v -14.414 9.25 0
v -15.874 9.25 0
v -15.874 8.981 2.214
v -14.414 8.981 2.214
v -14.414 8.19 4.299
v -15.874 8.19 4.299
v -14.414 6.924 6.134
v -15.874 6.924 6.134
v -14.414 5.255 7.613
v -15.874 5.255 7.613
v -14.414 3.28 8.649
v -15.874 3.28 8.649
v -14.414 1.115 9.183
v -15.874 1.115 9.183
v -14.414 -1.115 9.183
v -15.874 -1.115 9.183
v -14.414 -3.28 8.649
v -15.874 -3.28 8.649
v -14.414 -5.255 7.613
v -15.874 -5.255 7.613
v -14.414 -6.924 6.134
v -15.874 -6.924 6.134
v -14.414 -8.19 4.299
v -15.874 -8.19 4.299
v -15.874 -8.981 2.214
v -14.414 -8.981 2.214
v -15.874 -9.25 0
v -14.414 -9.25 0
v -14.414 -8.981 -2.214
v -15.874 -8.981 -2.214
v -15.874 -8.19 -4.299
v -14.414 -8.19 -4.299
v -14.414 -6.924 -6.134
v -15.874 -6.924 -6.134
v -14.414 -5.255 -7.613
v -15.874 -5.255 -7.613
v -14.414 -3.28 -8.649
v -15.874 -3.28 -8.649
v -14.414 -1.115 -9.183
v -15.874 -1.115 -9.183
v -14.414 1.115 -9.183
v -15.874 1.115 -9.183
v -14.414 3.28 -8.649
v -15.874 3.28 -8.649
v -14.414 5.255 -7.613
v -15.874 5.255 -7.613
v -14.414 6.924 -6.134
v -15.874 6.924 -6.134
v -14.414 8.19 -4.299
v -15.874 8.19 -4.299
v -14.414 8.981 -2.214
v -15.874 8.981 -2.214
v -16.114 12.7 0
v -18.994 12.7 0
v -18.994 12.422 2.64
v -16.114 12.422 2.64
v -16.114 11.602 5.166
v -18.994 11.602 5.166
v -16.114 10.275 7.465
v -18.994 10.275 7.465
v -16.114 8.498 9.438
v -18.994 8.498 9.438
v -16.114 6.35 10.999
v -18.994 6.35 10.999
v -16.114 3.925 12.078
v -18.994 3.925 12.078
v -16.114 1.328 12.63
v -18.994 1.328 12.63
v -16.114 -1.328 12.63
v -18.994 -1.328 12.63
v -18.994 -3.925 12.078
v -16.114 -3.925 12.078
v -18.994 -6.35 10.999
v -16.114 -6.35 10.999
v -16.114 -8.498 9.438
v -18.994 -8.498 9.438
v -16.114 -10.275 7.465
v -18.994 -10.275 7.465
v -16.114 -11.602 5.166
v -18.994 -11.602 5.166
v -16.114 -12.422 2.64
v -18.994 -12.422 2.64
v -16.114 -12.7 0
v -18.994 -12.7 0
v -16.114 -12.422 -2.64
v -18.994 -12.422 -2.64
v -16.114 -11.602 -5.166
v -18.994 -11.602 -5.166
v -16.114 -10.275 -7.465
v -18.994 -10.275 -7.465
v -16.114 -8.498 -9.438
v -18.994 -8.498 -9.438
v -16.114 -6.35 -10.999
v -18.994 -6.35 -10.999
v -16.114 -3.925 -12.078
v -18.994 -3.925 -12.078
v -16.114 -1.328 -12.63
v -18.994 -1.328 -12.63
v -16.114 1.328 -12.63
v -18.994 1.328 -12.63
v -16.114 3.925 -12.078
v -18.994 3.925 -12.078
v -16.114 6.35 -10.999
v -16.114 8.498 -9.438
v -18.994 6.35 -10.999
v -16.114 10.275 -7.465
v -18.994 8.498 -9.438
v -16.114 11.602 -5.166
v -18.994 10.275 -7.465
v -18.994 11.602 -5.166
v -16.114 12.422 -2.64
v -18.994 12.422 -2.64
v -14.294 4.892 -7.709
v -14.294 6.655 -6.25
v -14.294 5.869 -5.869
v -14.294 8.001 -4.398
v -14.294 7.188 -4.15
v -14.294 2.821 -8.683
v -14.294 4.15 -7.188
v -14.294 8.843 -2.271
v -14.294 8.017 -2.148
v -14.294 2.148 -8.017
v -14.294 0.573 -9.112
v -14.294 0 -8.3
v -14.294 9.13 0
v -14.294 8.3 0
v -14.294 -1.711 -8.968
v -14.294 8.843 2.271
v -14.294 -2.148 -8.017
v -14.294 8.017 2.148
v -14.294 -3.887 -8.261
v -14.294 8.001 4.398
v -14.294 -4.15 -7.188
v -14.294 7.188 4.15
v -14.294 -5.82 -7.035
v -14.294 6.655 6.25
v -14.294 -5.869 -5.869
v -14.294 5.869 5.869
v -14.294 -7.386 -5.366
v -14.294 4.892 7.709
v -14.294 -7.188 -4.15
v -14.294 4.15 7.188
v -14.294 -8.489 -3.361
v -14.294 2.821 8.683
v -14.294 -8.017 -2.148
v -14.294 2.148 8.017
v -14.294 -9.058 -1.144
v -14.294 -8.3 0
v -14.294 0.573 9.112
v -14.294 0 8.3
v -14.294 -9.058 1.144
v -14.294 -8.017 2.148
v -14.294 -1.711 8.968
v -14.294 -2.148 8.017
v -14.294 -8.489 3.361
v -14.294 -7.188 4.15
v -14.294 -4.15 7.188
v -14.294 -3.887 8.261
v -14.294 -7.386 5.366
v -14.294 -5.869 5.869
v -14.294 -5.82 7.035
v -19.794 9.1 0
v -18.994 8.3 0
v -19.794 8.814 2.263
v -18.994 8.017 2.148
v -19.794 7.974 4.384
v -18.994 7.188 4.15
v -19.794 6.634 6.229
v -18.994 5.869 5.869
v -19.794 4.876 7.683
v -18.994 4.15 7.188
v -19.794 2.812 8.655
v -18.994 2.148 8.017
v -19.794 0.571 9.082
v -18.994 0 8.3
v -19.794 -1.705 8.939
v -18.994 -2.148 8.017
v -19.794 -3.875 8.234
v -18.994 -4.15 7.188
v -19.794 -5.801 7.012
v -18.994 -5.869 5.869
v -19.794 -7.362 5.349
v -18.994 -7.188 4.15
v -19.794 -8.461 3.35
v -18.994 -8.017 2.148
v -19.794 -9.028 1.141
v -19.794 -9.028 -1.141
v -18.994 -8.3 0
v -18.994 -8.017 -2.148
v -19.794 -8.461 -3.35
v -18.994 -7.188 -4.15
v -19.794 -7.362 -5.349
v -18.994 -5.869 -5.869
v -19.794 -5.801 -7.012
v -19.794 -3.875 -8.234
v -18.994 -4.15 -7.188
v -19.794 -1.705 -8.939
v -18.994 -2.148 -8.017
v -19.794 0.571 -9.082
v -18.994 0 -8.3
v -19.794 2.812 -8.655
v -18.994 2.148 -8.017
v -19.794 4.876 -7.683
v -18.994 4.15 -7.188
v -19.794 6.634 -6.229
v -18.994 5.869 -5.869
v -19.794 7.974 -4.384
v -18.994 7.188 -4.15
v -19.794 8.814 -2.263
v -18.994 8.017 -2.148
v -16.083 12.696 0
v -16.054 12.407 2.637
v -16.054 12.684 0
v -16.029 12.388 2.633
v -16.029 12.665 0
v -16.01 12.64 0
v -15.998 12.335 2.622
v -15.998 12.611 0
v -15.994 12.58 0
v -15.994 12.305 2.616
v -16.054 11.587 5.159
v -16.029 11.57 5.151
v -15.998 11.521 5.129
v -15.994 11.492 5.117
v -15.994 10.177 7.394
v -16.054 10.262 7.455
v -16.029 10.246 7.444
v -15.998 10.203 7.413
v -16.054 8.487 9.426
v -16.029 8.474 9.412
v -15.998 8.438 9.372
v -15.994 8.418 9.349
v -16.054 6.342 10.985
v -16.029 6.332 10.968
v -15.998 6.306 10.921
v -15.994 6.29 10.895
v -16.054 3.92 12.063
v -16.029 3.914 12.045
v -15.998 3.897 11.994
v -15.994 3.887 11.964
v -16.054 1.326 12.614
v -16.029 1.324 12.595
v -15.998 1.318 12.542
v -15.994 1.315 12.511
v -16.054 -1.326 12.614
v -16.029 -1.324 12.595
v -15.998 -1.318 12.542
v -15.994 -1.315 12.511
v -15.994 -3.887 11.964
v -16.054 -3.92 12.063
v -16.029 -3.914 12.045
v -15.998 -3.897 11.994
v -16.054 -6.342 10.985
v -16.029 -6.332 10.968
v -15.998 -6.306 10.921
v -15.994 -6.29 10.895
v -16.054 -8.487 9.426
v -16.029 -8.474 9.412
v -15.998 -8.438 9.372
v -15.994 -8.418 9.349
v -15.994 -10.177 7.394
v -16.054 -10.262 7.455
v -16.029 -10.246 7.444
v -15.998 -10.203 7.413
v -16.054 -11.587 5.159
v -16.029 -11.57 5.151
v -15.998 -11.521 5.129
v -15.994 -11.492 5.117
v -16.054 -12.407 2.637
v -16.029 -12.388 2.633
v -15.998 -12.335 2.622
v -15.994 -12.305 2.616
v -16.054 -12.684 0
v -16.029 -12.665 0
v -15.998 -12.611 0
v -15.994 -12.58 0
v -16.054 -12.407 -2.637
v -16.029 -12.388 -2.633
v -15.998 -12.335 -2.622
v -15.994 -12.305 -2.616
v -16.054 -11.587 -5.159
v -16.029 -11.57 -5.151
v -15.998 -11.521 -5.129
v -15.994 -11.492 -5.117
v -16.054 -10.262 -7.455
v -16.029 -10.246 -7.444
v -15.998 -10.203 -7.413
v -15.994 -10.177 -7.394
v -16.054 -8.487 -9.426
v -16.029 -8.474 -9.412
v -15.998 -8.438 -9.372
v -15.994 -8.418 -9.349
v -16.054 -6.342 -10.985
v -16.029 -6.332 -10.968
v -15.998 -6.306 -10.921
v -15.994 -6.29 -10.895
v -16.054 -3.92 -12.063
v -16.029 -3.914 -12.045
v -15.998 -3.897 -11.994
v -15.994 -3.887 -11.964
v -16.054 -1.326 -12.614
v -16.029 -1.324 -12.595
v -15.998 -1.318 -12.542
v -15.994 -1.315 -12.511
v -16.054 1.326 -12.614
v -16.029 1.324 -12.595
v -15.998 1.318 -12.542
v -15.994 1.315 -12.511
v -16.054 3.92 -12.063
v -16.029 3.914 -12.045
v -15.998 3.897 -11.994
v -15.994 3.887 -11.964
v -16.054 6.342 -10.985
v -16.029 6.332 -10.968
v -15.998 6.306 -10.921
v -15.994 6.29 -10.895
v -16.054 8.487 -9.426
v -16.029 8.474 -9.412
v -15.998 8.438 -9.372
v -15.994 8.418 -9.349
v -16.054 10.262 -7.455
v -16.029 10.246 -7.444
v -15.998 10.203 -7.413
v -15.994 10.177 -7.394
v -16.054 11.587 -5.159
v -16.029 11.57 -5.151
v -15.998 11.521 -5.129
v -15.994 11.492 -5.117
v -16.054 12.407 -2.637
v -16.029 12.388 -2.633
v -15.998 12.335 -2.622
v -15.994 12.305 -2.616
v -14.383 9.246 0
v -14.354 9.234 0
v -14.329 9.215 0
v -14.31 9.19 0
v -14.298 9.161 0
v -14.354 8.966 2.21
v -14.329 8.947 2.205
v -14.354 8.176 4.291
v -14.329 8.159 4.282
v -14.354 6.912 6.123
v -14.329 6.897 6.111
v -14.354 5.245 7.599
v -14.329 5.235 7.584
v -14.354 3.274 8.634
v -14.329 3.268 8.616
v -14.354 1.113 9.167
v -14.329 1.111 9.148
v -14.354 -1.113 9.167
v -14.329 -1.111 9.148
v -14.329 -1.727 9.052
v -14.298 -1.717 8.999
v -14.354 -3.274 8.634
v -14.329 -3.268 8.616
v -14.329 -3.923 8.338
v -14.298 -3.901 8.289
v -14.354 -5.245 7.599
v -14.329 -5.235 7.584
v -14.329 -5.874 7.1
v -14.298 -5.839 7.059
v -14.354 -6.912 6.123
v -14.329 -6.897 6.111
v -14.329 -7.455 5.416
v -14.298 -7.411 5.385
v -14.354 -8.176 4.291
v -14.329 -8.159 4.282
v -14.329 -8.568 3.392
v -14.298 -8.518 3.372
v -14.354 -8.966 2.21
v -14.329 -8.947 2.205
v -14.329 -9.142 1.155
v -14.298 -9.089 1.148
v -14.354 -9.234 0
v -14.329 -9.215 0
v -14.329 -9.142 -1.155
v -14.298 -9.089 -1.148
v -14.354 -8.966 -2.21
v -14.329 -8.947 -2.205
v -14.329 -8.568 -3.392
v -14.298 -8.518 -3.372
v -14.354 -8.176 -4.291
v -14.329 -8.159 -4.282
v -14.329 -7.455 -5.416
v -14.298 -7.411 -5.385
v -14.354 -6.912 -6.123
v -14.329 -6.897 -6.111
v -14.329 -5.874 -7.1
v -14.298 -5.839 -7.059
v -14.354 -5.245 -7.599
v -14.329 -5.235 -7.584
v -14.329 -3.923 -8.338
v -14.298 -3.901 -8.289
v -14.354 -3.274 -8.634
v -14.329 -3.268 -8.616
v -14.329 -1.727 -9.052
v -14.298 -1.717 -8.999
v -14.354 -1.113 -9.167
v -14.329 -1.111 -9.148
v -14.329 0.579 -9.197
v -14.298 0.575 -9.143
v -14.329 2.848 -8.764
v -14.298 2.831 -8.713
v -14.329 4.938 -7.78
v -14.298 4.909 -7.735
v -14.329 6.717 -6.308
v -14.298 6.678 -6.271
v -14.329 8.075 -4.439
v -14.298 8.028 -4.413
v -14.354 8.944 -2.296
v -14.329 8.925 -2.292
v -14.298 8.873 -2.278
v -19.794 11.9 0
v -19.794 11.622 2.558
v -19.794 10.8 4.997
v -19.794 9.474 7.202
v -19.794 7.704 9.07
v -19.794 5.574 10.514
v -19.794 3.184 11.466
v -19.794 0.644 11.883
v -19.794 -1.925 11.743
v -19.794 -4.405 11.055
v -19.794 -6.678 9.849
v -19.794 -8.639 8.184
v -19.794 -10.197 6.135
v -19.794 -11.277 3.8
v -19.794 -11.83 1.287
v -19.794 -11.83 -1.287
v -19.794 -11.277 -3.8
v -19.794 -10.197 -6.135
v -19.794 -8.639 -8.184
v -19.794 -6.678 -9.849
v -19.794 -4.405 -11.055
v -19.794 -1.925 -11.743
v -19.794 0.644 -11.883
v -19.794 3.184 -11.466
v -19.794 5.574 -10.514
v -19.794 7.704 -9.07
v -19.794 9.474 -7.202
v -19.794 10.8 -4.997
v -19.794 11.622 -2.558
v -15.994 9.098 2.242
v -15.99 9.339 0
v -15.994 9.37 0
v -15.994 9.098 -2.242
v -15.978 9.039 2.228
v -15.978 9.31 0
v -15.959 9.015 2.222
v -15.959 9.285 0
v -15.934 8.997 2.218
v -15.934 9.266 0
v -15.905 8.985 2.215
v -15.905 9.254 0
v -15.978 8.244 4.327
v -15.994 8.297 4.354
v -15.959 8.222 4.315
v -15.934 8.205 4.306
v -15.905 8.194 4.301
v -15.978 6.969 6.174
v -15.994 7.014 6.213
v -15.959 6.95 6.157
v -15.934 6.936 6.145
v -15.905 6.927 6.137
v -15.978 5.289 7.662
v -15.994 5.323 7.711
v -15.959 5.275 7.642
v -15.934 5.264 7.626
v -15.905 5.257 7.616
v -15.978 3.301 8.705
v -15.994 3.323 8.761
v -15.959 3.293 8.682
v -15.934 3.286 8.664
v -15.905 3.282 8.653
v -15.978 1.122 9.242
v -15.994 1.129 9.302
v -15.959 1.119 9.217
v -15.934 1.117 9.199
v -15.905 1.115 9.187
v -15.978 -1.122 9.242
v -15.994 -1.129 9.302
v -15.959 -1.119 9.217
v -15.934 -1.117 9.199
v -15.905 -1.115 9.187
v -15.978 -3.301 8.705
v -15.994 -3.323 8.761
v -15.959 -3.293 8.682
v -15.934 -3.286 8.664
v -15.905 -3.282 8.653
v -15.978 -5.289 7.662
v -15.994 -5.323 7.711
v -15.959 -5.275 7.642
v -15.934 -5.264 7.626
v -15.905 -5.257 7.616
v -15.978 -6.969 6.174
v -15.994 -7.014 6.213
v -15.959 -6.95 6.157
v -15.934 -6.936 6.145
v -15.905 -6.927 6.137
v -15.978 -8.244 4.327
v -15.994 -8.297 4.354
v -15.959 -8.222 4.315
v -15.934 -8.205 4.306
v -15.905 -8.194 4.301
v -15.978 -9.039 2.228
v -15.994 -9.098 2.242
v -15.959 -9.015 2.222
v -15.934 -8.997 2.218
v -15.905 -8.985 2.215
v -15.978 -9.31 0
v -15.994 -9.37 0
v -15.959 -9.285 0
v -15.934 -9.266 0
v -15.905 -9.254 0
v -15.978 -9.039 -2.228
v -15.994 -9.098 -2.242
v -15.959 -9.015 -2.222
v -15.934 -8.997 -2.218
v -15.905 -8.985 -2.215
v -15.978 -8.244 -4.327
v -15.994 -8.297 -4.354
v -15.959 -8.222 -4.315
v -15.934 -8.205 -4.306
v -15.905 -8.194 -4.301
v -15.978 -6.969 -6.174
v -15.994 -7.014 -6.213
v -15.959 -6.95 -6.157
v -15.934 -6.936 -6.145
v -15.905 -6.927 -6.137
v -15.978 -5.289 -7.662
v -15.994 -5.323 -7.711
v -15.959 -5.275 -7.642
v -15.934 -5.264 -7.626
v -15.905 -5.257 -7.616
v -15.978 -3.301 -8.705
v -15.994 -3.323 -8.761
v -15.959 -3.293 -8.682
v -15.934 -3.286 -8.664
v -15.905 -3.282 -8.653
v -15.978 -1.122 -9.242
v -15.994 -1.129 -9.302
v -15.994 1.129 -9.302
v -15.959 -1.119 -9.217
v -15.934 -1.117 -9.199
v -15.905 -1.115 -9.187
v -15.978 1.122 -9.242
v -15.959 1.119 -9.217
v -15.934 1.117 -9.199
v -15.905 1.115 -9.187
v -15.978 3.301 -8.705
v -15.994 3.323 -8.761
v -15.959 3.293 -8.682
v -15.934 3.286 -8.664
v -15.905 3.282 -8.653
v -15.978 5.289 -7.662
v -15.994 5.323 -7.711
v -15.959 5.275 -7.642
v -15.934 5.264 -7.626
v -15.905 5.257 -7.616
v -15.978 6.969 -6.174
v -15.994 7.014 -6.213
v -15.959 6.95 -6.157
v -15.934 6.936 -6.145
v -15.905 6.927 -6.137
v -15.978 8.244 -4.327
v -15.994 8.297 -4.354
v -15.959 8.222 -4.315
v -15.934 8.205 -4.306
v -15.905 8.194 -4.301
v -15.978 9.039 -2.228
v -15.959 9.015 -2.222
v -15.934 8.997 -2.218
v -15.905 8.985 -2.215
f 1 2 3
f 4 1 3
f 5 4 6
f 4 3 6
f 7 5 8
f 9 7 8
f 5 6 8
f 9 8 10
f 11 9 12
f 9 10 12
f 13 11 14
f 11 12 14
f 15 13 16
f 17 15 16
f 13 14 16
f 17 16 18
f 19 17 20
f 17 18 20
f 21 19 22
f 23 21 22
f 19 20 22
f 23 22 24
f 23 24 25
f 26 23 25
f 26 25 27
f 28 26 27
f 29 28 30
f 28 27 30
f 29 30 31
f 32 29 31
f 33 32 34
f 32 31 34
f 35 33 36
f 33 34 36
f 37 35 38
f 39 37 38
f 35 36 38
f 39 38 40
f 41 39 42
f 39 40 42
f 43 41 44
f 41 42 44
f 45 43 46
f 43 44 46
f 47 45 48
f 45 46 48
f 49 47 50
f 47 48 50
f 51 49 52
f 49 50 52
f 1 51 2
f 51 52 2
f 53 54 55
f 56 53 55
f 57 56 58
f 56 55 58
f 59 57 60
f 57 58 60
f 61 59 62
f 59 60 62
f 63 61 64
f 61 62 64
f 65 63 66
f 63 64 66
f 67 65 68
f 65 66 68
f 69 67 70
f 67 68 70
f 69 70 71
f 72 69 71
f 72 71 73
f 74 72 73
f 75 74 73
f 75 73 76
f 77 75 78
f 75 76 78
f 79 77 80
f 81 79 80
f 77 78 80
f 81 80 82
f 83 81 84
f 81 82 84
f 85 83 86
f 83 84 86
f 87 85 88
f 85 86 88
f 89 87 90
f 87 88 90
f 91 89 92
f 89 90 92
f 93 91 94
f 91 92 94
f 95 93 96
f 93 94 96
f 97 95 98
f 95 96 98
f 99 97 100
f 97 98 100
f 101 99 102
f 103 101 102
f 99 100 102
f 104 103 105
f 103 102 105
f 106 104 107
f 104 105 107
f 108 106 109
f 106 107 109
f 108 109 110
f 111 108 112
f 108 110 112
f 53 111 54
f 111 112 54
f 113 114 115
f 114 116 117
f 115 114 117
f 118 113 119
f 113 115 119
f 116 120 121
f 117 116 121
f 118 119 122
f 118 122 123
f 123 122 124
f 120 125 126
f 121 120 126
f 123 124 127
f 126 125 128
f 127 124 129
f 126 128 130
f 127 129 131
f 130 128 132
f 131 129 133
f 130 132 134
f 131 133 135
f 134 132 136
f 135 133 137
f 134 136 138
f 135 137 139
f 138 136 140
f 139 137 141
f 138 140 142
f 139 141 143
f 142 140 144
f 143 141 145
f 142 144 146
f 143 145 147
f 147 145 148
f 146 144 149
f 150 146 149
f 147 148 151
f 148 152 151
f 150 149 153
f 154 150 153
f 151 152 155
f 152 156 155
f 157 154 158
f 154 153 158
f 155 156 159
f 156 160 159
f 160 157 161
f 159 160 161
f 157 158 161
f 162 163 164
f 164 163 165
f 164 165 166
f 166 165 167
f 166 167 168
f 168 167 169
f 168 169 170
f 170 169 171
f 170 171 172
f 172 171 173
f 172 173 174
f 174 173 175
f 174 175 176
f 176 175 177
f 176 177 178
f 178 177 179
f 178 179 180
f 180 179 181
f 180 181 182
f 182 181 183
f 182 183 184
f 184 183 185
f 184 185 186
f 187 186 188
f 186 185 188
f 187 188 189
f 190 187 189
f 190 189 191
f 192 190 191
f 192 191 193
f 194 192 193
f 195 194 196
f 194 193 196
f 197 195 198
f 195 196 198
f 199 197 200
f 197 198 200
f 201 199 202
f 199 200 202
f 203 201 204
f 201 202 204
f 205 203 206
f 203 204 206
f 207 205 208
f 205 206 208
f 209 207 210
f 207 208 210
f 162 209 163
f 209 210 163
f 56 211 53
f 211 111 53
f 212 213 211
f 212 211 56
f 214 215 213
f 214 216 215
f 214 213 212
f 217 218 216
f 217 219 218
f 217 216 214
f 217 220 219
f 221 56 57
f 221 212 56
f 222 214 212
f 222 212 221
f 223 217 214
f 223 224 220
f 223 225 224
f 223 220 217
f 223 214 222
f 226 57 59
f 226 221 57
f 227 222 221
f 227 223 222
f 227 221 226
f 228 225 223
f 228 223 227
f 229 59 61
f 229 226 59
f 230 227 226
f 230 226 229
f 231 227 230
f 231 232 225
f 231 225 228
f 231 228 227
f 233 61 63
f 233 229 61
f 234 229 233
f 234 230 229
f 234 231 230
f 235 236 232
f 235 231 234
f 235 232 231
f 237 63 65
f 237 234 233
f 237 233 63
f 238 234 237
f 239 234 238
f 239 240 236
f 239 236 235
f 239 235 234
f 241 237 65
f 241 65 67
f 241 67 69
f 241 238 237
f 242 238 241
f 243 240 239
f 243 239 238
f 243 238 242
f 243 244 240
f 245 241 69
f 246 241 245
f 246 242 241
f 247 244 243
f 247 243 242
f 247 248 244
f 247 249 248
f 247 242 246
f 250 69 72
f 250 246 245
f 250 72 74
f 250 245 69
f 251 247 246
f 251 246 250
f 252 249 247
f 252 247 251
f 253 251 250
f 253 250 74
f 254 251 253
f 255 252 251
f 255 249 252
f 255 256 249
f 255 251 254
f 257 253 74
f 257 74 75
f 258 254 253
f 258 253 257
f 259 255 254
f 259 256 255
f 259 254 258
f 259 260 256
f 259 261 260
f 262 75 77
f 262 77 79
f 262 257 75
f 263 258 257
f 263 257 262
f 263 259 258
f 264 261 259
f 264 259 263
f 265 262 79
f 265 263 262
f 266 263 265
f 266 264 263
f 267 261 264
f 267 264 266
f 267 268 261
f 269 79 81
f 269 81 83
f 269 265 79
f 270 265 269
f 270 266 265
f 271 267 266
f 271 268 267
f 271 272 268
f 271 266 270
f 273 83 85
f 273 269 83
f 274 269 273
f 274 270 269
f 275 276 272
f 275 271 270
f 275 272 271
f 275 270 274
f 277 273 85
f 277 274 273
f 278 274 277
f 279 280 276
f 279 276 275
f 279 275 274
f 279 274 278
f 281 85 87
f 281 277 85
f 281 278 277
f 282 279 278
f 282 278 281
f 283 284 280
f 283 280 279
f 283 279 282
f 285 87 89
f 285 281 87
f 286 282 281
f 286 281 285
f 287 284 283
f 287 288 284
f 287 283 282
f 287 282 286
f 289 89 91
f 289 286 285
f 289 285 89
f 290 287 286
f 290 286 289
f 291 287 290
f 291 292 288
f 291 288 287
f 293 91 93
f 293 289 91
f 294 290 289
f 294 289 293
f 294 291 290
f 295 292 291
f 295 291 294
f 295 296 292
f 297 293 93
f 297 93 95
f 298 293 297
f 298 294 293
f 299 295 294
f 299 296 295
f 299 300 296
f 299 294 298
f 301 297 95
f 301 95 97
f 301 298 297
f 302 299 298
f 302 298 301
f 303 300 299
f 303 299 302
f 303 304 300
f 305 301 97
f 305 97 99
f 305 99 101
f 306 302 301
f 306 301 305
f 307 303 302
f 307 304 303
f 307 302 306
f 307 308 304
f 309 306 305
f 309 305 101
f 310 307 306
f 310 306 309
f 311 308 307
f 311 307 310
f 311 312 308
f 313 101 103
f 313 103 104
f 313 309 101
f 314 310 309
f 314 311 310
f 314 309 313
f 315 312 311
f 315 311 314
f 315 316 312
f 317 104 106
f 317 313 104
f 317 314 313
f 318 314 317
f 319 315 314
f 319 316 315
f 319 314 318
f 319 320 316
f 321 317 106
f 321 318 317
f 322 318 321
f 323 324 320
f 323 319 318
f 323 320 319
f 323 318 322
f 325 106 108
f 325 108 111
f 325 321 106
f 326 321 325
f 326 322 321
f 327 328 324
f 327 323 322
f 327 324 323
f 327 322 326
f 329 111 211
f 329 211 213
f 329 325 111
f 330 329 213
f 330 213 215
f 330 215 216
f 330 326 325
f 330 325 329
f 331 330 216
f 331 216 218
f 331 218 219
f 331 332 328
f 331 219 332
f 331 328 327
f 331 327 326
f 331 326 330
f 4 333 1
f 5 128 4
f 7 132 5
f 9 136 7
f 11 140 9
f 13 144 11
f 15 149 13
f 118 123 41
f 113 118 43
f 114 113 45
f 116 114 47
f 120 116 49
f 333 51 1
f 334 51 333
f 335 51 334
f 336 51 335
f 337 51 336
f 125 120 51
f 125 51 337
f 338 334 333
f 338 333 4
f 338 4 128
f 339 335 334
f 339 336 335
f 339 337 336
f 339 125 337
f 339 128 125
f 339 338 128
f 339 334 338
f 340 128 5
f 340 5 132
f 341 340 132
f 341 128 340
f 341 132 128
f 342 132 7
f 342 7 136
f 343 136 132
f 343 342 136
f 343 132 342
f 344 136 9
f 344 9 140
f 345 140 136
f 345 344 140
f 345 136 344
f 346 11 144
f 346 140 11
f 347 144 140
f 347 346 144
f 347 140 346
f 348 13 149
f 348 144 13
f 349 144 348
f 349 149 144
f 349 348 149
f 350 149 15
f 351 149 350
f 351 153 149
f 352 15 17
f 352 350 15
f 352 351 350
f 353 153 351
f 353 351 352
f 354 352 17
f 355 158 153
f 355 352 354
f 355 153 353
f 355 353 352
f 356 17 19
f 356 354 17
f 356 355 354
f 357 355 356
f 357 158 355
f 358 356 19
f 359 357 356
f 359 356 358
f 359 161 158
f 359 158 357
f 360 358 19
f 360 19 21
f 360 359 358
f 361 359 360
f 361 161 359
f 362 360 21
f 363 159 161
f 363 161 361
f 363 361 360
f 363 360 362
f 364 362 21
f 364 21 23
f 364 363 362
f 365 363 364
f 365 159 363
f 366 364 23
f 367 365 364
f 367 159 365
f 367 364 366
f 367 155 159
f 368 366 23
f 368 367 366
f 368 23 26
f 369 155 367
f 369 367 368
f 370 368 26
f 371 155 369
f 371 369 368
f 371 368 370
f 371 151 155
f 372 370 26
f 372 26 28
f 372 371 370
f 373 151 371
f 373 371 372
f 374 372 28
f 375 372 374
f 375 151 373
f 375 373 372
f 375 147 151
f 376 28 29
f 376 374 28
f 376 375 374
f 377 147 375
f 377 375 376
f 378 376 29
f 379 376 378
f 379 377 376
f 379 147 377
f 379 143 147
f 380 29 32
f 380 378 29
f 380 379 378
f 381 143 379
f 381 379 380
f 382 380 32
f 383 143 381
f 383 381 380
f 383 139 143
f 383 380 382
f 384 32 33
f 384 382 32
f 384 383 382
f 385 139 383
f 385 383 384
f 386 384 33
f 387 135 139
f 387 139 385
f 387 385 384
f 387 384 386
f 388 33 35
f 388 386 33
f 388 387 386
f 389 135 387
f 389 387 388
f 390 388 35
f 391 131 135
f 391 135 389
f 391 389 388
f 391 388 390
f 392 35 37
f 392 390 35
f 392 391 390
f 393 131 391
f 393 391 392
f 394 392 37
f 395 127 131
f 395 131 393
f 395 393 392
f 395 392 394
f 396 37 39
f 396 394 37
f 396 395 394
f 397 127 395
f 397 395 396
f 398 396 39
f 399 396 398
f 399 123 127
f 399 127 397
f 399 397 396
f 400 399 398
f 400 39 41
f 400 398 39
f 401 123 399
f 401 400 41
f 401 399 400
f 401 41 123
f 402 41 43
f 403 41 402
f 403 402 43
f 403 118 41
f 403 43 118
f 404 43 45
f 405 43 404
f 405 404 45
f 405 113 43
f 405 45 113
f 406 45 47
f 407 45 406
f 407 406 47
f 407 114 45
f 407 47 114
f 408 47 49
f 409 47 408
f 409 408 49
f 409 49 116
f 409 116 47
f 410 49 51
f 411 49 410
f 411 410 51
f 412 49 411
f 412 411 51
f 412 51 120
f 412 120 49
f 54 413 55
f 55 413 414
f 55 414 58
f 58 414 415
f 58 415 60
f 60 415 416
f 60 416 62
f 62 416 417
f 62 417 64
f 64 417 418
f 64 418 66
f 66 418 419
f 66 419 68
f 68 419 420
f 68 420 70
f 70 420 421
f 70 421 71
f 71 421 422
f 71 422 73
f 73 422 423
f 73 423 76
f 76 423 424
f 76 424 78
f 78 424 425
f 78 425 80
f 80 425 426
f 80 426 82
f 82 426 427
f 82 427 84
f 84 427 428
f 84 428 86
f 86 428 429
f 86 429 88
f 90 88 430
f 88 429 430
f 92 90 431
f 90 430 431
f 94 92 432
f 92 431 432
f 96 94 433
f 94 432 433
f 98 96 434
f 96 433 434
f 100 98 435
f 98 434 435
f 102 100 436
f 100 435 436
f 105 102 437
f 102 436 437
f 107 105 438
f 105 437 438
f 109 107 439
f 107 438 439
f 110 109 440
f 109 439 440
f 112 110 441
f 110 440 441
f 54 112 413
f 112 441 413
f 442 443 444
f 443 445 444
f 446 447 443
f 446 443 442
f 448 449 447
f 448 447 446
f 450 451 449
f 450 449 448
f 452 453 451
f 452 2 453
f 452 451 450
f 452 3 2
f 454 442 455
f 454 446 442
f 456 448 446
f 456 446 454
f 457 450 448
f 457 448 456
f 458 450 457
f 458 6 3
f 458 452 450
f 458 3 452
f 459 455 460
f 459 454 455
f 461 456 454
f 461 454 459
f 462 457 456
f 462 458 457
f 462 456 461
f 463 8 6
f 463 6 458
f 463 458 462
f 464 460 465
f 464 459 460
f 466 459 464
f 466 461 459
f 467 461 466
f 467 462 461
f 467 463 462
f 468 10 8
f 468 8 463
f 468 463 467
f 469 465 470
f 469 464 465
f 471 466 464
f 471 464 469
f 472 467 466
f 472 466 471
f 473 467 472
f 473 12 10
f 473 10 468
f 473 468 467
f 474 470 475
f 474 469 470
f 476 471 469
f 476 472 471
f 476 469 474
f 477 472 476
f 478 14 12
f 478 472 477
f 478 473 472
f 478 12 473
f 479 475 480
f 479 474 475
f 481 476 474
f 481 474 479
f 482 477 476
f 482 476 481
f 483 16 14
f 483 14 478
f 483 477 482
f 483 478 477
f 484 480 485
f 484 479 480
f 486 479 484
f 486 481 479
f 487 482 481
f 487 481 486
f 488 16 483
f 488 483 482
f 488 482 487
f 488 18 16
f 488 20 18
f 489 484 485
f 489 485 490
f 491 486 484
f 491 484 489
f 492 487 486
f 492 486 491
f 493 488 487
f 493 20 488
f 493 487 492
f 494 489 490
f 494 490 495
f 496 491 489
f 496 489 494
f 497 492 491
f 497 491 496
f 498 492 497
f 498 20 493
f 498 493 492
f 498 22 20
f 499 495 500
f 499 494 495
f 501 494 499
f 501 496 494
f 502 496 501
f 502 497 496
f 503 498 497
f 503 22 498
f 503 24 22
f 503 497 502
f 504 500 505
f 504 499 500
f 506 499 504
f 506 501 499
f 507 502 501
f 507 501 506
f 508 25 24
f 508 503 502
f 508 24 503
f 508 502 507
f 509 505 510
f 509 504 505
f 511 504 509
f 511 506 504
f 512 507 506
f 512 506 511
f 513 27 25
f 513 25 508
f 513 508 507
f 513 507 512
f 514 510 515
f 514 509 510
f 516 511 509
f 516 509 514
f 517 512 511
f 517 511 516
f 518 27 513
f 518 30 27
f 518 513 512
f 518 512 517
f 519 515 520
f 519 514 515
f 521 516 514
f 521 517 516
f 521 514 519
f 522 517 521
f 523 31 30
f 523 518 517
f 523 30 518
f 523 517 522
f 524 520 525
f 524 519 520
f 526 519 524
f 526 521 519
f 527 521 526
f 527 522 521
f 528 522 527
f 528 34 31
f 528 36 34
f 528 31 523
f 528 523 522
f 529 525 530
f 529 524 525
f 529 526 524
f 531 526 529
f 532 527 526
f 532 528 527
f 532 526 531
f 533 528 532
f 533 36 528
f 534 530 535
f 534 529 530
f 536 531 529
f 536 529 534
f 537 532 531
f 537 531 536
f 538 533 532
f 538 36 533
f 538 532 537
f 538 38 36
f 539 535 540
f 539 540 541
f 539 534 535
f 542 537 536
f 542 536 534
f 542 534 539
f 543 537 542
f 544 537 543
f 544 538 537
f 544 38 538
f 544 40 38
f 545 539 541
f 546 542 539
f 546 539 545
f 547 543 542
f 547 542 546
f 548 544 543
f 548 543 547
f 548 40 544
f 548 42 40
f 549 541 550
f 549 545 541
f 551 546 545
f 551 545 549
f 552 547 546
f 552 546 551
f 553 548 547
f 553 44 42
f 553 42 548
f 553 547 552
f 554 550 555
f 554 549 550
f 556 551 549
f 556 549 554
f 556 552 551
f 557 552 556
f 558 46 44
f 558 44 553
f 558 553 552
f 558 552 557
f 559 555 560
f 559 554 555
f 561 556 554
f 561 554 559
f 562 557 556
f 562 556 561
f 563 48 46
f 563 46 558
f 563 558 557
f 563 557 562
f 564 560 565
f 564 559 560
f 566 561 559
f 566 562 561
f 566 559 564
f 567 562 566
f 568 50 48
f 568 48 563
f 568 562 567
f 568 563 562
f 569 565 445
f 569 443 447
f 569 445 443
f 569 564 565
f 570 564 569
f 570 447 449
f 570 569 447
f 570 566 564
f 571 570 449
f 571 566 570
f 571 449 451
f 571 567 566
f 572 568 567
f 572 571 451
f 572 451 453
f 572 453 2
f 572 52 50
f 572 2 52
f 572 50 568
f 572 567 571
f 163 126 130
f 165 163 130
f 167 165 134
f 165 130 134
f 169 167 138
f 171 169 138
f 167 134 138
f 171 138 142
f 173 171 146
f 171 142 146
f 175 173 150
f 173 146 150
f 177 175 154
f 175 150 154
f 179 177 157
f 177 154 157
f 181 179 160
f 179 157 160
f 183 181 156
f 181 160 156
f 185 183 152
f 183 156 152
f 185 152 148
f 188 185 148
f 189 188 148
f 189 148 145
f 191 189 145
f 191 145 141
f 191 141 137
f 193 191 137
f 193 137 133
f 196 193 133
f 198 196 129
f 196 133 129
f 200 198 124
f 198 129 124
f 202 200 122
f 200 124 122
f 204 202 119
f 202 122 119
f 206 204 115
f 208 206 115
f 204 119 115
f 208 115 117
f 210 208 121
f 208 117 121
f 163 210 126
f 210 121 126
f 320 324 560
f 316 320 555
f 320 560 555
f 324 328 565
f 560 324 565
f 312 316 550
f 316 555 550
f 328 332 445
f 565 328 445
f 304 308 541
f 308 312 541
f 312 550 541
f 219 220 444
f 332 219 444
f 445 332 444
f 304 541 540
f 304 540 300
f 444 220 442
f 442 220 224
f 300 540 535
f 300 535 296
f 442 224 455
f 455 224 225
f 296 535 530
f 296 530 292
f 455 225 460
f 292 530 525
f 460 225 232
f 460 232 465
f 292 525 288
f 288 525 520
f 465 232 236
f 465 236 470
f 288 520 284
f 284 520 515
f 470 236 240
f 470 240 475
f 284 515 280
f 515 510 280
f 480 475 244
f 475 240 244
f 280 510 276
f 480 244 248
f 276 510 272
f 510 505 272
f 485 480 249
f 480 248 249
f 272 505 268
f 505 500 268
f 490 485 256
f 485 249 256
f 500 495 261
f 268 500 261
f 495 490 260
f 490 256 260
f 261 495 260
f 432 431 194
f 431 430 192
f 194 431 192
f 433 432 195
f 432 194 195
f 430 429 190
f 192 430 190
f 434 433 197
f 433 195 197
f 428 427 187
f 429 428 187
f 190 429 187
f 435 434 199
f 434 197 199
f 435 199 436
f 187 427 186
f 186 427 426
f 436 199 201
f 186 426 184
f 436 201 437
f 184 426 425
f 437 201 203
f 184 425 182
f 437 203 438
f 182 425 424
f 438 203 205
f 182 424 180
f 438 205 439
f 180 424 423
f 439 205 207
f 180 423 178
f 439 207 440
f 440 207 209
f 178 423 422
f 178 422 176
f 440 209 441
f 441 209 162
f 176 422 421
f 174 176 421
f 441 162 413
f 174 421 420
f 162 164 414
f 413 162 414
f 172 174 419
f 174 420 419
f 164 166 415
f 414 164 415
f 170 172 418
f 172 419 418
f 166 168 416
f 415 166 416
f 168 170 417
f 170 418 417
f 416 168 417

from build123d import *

# Parameters (mm, degrees)
F2_SIZE = 0.8
F3_R    = 0.12


with BuildPart() as f1:
    # F0 (on Top) → F1 (revolve)
    with BuildSketch(Plane.XY):
        Polygon((-15.994198, 12.7), (-19.794198, 12.7), (-19.794198, 8.3), (-14.294198, 8.3), (-14.294198, 9.25), (-15.994198, 9.25), align=None)
    revolve(axis=Axis((-19.380304, 0, 0), (1, 0, 0)))

    # F2
    f2_edges = [f1.edges().sort_by_distance(p)[0] for p in [
        (-19.794198, -8.3, 0),
        (-19.794198, -12.7, 0),
    ]]
    chamfer(f2_edges, length=F2_SIZE)

    # F3
    f3_edges = [f1.edges().sort_by_distance(p)[0] for p in [
        (-15.994198, -9.25, 0),
        (-14.294198, -9.25, 0),
        (-15.994198, -12.7, 0),
    ]]
    fillet(f3_edges, radius=F3_R)


solid = f1.part
